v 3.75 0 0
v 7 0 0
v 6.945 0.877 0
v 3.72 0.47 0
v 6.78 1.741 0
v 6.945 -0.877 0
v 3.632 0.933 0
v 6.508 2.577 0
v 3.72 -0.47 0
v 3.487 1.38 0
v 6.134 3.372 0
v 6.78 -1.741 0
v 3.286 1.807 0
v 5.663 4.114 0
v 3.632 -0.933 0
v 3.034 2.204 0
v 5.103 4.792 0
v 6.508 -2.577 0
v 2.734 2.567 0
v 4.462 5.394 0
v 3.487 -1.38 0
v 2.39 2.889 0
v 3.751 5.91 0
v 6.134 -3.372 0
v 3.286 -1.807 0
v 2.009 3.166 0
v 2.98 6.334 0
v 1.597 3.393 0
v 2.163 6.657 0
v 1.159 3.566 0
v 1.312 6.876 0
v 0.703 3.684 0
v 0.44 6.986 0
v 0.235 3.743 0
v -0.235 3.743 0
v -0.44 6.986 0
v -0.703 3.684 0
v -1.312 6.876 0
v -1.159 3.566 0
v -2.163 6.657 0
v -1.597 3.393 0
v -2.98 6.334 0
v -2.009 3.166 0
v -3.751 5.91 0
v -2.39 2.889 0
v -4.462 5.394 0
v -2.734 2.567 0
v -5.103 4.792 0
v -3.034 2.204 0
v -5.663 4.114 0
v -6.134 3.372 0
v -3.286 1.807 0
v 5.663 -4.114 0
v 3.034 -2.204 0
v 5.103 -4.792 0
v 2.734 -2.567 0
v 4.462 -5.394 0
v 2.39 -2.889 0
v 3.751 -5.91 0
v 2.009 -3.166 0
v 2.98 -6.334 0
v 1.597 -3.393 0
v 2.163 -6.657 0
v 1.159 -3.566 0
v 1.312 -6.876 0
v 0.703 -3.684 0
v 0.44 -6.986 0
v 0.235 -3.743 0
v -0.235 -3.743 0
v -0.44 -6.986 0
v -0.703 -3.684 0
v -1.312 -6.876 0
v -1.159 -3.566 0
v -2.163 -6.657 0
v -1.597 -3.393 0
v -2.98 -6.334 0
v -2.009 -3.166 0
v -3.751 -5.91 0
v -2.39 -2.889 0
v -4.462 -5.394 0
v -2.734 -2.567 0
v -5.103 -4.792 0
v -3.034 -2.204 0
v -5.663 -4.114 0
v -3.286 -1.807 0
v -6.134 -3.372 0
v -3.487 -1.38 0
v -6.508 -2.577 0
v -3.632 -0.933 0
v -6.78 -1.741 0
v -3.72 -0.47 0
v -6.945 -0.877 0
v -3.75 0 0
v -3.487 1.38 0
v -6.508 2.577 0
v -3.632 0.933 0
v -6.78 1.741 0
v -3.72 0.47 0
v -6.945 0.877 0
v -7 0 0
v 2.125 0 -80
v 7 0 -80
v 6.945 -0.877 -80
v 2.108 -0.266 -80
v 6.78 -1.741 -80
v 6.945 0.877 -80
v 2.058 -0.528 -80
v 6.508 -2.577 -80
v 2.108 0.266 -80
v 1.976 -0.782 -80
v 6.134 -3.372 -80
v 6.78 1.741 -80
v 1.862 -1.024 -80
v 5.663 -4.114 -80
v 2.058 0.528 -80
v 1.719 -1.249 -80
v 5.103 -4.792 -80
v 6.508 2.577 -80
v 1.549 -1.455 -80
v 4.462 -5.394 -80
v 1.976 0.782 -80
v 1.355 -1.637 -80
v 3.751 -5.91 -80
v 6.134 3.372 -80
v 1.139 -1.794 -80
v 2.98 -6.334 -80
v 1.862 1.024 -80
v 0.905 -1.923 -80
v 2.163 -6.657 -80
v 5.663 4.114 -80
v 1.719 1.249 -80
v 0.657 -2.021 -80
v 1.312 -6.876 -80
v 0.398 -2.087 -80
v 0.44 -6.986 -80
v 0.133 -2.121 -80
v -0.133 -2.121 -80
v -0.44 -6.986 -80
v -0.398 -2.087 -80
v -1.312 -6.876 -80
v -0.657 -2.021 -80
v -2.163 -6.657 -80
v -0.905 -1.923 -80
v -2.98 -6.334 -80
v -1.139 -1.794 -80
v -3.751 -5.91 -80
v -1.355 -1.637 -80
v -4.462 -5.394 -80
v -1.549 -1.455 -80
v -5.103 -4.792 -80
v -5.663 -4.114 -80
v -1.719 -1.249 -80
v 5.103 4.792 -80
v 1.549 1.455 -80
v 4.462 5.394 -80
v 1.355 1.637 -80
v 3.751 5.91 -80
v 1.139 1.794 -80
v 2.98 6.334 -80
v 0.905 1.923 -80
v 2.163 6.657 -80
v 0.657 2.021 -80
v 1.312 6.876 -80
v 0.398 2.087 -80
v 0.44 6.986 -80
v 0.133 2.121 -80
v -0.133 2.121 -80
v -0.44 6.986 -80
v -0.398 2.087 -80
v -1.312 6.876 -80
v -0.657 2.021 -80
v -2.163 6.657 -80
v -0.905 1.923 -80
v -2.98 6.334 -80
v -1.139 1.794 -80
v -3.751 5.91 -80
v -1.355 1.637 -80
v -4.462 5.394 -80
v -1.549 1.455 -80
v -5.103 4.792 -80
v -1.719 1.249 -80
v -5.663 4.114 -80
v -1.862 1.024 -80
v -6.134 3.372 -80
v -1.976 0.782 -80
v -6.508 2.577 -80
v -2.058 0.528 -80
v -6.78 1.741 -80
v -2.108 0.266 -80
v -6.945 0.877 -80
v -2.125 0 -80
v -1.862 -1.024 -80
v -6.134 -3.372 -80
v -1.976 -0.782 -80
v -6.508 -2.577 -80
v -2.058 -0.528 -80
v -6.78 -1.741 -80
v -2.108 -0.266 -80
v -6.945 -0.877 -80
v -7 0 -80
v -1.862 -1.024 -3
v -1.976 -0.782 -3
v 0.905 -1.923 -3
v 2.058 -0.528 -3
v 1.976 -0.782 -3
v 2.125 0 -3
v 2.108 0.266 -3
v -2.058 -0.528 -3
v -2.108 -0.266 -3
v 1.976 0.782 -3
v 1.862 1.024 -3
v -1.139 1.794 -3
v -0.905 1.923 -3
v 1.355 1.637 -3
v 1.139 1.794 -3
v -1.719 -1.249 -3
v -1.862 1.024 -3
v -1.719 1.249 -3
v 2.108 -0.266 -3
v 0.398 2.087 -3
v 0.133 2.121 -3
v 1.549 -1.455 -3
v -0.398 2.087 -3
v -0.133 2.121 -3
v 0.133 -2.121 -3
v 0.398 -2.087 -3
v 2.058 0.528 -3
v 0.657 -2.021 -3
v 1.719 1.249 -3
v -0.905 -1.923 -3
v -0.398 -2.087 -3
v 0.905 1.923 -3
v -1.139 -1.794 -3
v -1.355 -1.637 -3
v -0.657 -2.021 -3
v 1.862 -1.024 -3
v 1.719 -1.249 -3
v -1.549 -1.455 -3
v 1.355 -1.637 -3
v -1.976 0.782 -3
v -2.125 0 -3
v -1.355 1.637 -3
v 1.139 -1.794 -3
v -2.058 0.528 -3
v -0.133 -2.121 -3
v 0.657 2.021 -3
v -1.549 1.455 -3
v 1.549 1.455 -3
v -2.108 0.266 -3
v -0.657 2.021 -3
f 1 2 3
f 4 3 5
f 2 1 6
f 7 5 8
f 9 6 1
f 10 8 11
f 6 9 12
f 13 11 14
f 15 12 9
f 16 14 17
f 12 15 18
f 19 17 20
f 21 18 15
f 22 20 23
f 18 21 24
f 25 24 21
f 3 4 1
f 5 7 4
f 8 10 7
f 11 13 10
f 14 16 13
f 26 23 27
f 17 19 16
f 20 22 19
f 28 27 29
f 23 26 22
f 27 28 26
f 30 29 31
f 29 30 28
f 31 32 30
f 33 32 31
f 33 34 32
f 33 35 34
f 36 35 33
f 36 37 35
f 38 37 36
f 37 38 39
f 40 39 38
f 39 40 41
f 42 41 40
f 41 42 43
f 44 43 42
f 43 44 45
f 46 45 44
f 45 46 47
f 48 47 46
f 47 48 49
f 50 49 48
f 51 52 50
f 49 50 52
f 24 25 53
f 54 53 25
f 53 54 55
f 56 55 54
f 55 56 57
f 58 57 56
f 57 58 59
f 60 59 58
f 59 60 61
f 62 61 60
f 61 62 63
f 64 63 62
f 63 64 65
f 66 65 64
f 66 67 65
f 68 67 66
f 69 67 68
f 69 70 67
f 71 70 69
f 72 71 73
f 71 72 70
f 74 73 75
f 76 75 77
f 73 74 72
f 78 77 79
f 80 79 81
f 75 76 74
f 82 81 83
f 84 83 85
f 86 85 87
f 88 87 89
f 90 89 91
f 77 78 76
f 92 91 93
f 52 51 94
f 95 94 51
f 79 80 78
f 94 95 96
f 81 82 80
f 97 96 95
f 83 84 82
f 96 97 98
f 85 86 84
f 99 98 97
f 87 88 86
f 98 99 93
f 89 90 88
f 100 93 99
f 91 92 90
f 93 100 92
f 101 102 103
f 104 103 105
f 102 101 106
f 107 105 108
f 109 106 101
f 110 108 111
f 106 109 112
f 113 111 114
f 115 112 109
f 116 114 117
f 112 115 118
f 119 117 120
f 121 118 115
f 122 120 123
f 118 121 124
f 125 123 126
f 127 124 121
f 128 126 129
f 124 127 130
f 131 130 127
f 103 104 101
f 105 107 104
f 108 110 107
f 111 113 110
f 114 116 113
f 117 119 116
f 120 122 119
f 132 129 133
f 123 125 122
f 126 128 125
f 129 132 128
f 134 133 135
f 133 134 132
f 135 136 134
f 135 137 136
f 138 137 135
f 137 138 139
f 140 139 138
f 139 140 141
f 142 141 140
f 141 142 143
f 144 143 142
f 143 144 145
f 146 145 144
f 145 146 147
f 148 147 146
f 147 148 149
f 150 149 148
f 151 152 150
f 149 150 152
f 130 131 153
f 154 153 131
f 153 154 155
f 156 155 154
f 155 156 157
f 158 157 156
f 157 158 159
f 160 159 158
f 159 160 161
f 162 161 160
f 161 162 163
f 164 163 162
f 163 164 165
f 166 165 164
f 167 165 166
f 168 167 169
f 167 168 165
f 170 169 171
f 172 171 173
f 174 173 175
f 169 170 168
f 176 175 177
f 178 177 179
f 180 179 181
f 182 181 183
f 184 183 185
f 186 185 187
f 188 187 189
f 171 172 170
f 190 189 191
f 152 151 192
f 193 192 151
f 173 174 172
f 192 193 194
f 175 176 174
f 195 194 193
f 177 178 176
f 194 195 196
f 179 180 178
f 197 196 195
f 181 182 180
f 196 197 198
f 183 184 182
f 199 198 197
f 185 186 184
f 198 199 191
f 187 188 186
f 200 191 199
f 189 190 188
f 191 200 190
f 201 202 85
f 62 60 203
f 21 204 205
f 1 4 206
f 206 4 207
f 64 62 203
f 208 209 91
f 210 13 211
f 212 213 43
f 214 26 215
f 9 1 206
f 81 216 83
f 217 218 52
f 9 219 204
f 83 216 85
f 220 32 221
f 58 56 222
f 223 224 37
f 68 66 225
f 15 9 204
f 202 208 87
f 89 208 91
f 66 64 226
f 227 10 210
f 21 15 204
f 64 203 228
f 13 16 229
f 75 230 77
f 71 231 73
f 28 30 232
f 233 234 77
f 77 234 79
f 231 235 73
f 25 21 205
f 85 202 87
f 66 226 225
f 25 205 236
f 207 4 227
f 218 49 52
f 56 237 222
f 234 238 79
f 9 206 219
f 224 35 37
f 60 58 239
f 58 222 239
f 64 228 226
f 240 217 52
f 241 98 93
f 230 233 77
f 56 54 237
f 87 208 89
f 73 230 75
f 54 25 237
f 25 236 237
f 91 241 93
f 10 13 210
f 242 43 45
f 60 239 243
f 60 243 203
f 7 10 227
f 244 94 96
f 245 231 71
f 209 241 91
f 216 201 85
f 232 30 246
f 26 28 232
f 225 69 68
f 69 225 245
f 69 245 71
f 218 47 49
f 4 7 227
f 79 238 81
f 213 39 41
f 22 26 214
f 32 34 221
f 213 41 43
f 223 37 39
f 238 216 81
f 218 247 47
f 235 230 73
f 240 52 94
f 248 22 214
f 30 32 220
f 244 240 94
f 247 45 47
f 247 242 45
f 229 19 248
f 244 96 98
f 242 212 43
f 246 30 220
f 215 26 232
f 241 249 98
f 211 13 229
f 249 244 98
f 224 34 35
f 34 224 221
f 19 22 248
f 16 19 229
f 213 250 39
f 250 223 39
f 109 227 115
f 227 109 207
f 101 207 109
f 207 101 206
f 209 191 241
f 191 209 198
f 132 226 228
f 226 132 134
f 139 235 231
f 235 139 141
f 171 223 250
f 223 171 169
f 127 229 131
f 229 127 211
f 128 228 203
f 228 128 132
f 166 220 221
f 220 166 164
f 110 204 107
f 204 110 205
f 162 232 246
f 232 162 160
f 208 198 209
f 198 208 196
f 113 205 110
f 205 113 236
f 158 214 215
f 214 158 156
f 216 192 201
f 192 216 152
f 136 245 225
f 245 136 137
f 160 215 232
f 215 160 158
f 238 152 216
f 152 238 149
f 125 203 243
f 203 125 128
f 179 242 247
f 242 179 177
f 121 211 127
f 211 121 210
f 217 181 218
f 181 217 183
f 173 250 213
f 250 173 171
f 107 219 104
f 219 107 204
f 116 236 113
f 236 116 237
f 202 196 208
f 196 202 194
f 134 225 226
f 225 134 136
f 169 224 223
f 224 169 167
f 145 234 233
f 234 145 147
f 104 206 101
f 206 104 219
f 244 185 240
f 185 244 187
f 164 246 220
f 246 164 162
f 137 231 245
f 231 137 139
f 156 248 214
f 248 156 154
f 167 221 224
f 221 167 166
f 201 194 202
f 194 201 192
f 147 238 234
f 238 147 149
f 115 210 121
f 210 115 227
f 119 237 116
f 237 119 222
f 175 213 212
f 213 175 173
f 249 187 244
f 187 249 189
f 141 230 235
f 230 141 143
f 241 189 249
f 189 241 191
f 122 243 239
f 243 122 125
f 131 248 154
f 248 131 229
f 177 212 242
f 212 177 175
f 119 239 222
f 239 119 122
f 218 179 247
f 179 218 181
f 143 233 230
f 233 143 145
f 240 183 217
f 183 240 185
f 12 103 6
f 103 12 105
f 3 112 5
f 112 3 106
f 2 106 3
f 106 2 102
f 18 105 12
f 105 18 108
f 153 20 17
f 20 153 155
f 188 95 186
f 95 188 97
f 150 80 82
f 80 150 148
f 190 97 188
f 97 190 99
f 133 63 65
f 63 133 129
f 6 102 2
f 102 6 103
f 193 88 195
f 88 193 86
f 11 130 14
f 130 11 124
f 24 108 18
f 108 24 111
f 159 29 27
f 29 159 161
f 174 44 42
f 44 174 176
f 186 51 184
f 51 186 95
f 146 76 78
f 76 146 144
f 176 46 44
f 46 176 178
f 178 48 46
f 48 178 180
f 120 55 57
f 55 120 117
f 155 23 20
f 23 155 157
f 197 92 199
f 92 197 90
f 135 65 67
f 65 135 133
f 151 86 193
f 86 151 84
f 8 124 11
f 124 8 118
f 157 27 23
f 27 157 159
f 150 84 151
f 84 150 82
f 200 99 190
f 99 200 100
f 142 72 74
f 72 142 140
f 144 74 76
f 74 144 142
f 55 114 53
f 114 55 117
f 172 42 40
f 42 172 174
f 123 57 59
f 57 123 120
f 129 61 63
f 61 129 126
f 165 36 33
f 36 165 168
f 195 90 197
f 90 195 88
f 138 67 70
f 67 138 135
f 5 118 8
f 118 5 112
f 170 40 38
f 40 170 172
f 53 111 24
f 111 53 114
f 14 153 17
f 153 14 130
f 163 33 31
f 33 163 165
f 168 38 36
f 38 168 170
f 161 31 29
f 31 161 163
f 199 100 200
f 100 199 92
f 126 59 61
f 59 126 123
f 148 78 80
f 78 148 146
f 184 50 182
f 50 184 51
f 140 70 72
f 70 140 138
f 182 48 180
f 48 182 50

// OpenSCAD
$fn = 50;


difference() {
	union() {
		translate(v = [0, 0, -80.0000000000]) {
			cylinder(h = 80, r = 7.0000000000);
		}
		cylinder(h = 0, r = 17.0000000000);
	}
	union() {
		translate(v = [0, 0, 0]) {
			rotate(a = [0, 0, 0]) {
				difference() {
					union() {
						#translate(v = [0, 0, -80.0000000000]) {
							cylinder(h = 80, r = 2.0000000000);
						}
						#translate(v = [0, 0, -3]) {
							cylinder(h = 3, r = 7.0000000000, r1 = 2.1250000000, r2 = 3.7500000000);
						}
						#translate(v = [0, 0, -80.0000000000]) {
							cylinder(h = 80, r = 2.1250000000);
						}
						#translate(v = [0, 0, -80.0000000000]) {
							cylinder(h = 80, r = 2.0000000000);
						}
					}
					union();
				}
			}
		}
	}
}
